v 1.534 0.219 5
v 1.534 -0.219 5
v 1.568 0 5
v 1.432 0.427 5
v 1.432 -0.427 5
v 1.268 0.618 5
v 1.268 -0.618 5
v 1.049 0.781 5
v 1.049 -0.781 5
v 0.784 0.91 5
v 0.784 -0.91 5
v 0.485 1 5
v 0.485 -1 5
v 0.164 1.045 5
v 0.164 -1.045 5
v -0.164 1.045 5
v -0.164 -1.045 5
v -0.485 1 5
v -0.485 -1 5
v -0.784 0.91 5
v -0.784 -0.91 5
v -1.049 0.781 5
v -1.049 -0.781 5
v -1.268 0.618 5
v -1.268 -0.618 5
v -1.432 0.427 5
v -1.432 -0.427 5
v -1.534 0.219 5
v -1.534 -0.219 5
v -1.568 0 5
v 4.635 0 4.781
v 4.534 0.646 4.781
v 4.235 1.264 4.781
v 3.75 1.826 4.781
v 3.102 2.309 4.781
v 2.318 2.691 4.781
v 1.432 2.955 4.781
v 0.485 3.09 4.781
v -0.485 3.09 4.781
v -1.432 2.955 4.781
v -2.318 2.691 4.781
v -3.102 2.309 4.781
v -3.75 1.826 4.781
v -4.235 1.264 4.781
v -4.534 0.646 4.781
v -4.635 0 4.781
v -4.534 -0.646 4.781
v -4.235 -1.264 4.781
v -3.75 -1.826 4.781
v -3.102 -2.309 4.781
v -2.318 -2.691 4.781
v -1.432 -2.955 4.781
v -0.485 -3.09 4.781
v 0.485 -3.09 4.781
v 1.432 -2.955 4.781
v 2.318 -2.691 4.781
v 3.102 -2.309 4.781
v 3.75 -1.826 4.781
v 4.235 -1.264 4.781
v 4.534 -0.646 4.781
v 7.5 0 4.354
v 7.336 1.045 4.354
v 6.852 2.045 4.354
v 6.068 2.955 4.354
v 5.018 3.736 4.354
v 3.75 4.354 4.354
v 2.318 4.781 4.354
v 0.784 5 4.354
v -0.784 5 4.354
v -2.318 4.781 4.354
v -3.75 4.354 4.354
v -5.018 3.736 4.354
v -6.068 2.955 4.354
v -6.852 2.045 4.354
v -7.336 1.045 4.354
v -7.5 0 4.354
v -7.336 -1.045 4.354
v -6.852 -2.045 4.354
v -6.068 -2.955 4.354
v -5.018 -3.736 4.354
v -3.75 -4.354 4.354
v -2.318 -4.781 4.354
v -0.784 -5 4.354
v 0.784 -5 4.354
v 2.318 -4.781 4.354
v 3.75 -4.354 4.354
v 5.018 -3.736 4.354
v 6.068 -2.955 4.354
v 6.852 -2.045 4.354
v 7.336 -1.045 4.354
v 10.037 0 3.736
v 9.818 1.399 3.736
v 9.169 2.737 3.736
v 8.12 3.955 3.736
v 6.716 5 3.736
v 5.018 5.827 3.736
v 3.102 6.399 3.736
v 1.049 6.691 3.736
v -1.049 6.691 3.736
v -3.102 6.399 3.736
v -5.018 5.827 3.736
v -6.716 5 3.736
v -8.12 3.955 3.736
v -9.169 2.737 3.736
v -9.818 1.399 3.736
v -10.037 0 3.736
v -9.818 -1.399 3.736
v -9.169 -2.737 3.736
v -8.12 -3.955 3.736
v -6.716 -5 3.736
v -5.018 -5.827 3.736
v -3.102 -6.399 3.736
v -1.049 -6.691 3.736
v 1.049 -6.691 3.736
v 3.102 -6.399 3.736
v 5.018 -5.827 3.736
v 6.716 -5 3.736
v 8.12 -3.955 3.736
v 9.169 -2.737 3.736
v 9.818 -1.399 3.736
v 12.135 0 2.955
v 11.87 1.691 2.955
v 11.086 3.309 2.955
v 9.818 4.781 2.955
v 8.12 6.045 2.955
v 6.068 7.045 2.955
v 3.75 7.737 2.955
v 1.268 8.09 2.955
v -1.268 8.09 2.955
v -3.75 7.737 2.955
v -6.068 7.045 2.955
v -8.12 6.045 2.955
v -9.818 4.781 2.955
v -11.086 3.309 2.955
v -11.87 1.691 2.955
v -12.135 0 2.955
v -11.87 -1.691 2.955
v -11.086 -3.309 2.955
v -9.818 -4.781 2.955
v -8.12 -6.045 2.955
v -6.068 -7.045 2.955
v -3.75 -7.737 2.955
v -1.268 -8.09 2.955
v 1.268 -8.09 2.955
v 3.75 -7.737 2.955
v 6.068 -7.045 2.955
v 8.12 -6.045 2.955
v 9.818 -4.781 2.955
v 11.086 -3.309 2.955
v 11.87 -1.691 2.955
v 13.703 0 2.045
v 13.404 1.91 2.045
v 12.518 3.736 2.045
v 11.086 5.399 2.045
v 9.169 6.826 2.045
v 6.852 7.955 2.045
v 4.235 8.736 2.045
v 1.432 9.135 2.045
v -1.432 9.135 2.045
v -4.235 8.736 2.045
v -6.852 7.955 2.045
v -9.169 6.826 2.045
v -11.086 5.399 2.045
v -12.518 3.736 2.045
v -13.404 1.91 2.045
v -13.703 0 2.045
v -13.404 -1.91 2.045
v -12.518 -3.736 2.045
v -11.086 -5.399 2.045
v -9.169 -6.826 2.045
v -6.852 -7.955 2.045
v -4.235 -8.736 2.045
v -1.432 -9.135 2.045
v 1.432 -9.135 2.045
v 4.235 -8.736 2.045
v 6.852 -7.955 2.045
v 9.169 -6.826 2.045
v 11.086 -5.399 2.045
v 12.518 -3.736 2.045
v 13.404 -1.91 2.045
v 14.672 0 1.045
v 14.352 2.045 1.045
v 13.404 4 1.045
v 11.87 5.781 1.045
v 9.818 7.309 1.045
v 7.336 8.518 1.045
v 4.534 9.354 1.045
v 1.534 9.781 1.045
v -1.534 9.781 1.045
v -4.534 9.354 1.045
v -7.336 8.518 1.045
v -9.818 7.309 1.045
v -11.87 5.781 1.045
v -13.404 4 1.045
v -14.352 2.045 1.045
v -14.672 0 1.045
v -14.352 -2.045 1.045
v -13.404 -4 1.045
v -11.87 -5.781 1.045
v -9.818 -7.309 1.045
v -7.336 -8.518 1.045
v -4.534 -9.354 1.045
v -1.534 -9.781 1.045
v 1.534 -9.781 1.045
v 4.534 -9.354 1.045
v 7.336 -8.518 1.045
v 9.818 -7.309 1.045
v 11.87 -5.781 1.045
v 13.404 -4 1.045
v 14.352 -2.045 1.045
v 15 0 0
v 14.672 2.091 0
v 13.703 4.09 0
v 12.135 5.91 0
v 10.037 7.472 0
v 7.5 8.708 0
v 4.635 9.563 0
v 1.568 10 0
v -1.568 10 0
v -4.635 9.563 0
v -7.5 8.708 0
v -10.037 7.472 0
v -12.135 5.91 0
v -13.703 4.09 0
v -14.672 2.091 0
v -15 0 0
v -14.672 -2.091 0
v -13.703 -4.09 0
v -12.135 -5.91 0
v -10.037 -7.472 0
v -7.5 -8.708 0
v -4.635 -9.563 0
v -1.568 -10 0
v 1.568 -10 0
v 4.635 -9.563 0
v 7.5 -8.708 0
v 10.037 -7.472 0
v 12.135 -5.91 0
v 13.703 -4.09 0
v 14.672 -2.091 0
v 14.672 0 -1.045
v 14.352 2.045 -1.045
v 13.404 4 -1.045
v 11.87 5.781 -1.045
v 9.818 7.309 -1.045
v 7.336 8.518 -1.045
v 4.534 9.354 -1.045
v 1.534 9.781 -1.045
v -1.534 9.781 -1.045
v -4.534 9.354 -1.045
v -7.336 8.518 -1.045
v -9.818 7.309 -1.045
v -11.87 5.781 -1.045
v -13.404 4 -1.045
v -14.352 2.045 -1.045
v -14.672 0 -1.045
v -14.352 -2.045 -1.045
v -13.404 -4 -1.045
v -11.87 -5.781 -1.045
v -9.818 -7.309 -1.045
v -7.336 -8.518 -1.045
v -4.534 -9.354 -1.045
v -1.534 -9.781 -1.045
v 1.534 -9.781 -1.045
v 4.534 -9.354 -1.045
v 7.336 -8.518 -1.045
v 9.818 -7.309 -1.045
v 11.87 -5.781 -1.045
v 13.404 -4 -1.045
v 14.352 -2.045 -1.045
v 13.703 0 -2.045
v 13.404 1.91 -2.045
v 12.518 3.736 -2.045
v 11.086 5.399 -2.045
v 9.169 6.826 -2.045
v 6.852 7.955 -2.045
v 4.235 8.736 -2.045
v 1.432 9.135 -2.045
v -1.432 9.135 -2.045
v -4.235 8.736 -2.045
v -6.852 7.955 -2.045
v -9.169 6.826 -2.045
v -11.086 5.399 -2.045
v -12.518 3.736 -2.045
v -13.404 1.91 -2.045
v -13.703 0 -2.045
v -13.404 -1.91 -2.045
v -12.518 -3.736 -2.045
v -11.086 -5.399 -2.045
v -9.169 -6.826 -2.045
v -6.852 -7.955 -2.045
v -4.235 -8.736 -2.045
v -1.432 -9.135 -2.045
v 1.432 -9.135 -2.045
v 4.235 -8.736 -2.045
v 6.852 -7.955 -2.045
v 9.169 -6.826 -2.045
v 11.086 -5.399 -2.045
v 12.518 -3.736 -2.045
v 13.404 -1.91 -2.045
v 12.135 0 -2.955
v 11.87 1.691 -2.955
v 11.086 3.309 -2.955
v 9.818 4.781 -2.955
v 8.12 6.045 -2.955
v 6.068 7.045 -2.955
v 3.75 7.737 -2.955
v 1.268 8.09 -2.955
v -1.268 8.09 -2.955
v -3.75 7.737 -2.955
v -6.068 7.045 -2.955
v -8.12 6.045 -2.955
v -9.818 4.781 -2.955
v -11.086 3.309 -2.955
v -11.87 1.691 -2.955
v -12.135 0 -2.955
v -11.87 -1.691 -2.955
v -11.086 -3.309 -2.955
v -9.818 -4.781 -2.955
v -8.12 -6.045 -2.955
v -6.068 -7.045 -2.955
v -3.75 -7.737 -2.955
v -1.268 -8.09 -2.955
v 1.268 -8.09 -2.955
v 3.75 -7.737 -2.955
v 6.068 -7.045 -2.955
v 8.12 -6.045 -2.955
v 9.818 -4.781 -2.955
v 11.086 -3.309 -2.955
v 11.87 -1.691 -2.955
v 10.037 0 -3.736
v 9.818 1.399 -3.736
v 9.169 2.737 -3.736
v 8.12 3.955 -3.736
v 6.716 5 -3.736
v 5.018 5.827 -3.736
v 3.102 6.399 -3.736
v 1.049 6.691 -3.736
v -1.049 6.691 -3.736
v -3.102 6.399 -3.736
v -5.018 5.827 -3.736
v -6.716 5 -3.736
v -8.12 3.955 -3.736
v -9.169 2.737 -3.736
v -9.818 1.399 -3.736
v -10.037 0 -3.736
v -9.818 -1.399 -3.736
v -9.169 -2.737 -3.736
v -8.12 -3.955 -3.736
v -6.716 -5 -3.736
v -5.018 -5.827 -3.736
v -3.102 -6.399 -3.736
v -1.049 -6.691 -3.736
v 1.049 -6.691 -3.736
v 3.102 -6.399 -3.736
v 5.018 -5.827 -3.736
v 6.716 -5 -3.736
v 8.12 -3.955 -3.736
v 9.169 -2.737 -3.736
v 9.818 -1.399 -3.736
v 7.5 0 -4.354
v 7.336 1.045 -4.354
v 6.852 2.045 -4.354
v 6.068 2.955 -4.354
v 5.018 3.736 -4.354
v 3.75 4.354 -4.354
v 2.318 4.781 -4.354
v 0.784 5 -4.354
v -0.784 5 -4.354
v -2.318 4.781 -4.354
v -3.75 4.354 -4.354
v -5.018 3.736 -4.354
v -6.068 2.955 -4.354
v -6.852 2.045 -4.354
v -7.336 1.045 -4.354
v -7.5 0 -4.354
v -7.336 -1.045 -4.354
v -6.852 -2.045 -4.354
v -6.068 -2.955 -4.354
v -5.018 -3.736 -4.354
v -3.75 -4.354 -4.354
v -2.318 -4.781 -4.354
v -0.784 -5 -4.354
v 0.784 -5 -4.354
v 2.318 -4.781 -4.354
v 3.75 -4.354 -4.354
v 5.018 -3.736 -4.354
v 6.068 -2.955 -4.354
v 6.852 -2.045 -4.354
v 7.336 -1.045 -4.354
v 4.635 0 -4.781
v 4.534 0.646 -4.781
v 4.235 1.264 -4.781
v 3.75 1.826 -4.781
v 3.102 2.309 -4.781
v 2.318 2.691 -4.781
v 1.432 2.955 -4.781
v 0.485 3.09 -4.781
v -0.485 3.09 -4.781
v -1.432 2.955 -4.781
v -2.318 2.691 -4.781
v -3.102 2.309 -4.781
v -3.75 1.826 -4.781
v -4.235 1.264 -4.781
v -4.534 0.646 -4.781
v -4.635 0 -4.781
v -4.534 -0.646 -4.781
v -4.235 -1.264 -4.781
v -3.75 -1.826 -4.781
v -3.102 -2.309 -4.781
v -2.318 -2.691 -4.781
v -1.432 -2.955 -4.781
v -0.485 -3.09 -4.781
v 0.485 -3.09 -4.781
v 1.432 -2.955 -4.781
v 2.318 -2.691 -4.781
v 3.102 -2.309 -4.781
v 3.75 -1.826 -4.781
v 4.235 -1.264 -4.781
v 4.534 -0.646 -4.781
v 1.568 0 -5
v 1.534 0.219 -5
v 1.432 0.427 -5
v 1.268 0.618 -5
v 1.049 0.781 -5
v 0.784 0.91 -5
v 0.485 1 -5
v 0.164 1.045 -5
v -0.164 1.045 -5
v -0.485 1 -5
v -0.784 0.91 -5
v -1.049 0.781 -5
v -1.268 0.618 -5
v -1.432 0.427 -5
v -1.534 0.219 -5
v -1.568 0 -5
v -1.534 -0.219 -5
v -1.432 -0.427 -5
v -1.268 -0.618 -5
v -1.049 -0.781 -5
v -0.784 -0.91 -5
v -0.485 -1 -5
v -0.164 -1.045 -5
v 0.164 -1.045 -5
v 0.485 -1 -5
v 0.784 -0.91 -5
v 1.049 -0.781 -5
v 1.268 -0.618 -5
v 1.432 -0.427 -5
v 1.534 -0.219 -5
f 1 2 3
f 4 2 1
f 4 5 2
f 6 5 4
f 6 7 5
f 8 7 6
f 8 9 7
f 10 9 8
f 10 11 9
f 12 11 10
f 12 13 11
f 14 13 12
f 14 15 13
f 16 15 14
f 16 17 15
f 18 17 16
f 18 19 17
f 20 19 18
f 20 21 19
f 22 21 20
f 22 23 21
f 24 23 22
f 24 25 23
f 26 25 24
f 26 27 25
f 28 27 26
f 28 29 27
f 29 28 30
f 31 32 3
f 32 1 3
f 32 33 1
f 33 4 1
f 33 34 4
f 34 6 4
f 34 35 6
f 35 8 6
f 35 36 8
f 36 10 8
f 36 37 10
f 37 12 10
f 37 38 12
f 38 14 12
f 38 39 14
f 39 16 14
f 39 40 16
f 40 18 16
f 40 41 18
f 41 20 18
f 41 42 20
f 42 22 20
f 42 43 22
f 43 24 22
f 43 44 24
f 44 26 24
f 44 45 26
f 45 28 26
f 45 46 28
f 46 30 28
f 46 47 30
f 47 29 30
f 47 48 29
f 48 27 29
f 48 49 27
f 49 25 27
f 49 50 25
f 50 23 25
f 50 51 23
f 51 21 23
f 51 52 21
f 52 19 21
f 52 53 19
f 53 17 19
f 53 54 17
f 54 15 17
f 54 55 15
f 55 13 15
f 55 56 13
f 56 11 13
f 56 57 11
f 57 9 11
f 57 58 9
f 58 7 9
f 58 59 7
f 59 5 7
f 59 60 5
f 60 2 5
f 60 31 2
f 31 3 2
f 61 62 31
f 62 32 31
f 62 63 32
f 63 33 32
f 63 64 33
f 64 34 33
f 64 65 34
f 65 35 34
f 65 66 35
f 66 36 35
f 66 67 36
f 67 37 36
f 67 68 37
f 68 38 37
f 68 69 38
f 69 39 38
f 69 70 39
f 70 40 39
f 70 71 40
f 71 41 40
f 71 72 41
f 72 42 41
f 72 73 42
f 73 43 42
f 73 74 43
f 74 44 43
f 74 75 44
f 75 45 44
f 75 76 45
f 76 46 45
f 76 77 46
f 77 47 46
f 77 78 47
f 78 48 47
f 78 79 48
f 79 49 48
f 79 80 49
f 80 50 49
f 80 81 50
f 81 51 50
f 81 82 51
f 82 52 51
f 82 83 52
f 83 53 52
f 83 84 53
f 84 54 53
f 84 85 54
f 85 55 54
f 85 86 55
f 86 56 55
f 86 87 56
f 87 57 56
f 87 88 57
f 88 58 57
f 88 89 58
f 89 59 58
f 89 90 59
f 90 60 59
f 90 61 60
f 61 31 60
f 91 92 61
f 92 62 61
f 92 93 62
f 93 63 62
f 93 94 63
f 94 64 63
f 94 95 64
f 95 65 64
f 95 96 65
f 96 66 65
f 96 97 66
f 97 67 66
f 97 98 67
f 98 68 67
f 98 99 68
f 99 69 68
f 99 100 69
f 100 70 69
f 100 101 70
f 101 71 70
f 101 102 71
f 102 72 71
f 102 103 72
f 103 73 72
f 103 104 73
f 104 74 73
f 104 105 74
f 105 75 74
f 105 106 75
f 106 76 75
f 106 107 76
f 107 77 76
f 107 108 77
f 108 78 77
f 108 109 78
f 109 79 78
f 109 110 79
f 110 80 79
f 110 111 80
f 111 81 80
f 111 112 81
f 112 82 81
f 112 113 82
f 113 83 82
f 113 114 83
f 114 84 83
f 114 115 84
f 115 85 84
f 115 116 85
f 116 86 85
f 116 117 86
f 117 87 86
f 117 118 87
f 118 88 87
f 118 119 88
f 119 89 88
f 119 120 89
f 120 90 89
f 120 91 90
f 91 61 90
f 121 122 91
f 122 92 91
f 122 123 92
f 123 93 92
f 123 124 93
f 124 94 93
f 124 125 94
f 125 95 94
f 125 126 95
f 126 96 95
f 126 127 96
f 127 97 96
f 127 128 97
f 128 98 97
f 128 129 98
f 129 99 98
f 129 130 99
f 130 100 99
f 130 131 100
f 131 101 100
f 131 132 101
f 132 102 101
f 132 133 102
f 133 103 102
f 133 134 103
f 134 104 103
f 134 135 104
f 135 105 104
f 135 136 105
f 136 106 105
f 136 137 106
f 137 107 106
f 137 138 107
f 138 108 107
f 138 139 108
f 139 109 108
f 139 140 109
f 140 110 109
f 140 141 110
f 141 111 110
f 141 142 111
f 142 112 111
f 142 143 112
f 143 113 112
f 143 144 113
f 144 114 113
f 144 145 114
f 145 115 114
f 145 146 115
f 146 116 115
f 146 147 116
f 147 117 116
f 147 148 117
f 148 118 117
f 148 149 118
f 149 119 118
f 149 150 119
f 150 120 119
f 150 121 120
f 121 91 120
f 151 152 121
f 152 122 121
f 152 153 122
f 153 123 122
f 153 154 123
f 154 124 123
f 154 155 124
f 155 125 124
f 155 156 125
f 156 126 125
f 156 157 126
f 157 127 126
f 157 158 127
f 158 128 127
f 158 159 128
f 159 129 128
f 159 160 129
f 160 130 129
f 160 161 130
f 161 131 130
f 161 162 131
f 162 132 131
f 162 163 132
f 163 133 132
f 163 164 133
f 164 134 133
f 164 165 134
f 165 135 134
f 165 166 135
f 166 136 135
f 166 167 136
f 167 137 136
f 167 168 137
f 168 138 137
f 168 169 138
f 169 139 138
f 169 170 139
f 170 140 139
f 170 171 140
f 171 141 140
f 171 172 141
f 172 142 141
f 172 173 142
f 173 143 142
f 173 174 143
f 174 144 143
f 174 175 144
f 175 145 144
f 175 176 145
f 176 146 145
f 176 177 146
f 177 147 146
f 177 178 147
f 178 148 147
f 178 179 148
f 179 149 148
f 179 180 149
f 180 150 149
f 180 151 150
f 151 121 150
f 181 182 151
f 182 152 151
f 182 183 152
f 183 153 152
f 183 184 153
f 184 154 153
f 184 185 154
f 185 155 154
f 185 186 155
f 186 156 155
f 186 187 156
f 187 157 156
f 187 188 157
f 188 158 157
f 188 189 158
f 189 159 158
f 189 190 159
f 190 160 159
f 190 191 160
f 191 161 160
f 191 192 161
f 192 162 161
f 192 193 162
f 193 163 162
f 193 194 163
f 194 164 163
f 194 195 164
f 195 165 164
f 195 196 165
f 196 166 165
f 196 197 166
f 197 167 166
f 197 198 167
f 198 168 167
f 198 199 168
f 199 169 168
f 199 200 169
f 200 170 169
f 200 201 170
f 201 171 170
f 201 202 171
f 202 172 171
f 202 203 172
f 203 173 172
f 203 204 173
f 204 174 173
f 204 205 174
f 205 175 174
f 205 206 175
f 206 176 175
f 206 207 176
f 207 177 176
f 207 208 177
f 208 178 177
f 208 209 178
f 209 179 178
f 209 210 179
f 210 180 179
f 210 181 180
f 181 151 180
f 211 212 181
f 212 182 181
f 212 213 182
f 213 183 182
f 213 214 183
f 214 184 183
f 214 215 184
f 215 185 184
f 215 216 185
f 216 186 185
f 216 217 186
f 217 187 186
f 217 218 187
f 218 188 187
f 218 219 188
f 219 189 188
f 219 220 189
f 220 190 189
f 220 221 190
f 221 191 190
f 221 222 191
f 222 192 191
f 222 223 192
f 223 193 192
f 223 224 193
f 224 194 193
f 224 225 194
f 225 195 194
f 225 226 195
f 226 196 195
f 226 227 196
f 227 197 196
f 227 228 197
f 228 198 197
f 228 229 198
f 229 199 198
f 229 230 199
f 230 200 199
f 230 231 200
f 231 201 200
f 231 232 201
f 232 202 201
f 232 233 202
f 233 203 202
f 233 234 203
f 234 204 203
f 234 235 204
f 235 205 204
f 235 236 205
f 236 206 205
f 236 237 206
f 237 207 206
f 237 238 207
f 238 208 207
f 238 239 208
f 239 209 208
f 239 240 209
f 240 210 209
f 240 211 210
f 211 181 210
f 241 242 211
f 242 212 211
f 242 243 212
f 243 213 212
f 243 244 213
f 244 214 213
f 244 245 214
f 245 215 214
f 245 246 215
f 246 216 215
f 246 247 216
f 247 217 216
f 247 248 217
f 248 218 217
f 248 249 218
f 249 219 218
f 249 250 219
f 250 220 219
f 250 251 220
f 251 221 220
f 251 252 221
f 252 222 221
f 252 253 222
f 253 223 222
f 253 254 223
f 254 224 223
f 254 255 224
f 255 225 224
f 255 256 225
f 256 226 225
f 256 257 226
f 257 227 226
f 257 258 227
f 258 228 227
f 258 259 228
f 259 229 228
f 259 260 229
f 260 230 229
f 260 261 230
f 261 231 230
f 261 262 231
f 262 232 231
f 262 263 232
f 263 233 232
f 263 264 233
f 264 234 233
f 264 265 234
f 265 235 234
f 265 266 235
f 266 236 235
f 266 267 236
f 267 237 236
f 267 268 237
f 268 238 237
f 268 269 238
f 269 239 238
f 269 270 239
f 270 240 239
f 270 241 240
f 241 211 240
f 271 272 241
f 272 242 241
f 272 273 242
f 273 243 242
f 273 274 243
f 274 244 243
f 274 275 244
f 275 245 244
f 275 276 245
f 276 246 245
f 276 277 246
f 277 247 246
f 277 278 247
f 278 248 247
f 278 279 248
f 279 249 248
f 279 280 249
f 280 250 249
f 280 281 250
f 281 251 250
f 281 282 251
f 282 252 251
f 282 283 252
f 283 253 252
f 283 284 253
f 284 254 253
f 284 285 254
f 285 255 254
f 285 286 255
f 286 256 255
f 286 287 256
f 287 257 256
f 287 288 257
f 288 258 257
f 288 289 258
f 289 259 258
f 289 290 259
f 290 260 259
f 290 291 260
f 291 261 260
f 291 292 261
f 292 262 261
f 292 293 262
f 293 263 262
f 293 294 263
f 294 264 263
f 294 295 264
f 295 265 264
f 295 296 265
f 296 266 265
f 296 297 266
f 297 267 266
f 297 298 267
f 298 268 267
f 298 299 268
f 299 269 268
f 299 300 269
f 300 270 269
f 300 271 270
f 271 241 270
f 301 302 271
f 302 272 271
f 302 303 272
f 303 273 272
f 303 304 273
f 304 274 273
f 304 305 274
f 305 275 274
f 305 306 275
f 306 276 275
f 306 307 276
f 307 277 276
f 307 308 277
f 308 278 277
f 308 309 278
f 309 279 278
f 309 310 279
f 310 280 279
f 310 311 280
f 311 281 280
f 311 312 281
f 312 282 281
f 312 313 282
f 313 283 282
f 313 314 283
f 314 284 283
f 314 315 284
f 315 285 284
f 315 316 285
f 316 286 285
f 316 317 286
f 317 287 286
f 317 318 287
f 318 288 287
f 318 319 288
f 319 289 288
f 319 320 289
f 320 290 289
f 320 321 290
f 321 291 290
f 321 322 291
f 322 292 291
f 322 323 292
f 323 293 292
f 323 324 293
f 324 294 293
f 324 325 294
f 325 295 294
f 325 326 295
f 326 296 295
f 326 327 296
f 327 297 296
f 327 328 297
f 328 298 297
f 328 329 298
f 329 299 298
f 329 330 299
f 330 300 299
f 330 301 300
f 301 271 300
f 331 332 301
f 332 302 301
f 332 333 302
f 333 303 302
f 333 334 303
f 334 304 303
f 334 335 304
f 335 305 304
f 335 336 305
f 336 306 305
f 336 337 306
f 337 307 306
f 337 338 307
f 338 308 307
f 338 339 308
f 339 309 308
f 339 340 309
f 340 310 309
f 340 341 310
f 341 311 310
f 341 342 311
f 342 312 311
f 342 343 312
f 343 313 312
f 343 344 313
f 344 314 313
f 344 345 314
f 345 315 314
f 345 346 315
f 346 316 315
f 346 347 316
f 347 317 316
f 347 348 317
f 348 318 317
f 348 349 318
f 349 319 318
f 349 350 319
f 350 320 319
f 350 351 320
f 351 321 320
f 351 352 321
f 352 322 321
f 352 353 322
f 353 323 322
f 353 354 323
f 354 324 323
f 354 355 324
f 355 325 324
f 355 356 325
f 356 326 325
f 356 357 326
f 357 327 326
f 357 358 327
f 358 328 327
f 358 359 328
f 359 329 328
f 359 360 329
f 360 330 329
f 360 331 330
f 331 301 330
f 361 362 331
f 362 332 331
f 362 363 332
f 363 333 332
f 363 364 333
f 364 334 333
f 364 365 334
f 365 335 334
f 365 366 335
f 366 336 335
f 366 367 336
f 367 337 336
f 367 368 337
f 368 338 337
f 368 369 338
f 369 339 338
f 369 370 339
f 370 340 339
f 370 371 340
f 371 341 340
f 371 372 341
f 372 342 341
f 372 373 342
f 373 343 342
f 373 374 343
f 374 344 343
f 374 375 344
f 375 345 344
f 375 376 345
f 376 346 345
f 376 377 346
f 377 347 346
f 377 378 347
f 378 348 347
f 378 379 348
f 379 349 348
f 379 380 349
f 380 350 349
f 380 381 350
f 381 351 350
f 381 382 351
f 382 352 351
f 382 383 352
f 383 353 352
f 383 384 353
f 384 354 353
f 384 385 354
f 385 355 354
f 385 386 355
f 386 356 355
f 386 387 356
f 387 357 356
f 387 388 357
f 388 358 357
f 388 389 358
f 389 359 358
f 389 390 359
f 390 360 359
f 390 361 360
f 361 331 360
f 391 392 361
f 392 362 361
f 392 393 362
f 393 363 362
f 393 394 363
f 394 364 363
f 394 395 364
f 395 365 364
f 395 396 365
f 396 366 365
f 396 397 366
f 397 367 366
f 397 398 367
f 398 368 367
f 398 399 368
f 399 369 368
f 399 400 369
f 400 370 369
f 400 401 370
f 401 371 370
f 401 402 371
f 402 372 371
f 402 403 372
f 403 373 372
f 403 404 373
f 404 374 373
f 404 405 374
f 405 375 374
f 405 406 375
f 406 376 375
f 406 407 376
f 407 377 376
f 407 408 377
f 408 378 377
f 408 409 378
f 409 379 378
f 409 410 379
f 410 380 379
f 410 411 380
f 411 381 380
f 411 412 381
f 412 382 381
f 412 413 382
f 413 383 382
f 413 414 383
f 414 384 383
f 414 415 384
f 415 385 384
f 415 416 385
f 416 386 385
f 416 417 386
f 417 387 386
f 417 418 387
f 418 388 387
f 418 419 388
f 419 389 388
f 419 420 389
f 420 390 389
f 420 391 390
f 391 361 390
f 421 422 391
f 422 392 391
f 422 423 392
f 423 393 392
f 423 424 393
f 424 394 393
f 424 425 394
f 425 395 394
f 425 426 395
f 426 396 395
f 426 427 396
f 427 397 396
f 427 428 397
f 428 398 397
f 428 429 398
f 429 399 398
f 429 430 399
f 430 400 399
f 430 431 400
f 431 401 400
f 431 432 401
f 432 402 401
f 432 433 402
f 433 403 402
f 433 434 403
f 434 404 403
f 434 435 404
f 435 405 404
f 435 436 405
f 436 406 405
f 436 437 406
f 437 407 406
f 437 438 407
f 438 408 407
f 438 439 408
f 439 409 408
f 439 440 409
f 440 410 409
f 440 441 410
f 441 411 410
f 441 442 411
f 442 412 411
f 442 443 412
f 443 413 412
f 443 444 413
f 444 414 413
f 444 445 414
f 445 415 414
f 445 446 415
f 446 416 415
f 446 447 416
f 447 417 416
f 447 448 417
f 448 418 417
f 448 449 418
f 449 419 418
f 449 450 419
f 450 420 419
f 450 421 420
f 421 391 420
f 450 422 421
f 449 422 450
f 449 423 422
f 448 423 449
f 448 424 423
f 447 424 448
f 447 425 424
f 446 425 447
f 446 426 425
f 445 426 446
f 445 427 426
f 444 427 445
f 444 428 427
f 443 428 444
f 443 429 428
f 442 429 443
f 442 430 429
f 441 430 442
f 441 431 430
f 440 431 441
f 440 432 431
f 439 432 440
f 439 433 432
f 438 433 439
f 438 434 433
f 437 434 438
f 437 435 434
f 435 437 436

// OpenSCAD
// Unit of length: Unit.MM
resize(newsize = [30.0, 20.0, 10.0], auto = [false, false, false])
{
   sphere(d = 30.0, $fa = 12.0, $fs = 2.0, $fn = 0);
}
